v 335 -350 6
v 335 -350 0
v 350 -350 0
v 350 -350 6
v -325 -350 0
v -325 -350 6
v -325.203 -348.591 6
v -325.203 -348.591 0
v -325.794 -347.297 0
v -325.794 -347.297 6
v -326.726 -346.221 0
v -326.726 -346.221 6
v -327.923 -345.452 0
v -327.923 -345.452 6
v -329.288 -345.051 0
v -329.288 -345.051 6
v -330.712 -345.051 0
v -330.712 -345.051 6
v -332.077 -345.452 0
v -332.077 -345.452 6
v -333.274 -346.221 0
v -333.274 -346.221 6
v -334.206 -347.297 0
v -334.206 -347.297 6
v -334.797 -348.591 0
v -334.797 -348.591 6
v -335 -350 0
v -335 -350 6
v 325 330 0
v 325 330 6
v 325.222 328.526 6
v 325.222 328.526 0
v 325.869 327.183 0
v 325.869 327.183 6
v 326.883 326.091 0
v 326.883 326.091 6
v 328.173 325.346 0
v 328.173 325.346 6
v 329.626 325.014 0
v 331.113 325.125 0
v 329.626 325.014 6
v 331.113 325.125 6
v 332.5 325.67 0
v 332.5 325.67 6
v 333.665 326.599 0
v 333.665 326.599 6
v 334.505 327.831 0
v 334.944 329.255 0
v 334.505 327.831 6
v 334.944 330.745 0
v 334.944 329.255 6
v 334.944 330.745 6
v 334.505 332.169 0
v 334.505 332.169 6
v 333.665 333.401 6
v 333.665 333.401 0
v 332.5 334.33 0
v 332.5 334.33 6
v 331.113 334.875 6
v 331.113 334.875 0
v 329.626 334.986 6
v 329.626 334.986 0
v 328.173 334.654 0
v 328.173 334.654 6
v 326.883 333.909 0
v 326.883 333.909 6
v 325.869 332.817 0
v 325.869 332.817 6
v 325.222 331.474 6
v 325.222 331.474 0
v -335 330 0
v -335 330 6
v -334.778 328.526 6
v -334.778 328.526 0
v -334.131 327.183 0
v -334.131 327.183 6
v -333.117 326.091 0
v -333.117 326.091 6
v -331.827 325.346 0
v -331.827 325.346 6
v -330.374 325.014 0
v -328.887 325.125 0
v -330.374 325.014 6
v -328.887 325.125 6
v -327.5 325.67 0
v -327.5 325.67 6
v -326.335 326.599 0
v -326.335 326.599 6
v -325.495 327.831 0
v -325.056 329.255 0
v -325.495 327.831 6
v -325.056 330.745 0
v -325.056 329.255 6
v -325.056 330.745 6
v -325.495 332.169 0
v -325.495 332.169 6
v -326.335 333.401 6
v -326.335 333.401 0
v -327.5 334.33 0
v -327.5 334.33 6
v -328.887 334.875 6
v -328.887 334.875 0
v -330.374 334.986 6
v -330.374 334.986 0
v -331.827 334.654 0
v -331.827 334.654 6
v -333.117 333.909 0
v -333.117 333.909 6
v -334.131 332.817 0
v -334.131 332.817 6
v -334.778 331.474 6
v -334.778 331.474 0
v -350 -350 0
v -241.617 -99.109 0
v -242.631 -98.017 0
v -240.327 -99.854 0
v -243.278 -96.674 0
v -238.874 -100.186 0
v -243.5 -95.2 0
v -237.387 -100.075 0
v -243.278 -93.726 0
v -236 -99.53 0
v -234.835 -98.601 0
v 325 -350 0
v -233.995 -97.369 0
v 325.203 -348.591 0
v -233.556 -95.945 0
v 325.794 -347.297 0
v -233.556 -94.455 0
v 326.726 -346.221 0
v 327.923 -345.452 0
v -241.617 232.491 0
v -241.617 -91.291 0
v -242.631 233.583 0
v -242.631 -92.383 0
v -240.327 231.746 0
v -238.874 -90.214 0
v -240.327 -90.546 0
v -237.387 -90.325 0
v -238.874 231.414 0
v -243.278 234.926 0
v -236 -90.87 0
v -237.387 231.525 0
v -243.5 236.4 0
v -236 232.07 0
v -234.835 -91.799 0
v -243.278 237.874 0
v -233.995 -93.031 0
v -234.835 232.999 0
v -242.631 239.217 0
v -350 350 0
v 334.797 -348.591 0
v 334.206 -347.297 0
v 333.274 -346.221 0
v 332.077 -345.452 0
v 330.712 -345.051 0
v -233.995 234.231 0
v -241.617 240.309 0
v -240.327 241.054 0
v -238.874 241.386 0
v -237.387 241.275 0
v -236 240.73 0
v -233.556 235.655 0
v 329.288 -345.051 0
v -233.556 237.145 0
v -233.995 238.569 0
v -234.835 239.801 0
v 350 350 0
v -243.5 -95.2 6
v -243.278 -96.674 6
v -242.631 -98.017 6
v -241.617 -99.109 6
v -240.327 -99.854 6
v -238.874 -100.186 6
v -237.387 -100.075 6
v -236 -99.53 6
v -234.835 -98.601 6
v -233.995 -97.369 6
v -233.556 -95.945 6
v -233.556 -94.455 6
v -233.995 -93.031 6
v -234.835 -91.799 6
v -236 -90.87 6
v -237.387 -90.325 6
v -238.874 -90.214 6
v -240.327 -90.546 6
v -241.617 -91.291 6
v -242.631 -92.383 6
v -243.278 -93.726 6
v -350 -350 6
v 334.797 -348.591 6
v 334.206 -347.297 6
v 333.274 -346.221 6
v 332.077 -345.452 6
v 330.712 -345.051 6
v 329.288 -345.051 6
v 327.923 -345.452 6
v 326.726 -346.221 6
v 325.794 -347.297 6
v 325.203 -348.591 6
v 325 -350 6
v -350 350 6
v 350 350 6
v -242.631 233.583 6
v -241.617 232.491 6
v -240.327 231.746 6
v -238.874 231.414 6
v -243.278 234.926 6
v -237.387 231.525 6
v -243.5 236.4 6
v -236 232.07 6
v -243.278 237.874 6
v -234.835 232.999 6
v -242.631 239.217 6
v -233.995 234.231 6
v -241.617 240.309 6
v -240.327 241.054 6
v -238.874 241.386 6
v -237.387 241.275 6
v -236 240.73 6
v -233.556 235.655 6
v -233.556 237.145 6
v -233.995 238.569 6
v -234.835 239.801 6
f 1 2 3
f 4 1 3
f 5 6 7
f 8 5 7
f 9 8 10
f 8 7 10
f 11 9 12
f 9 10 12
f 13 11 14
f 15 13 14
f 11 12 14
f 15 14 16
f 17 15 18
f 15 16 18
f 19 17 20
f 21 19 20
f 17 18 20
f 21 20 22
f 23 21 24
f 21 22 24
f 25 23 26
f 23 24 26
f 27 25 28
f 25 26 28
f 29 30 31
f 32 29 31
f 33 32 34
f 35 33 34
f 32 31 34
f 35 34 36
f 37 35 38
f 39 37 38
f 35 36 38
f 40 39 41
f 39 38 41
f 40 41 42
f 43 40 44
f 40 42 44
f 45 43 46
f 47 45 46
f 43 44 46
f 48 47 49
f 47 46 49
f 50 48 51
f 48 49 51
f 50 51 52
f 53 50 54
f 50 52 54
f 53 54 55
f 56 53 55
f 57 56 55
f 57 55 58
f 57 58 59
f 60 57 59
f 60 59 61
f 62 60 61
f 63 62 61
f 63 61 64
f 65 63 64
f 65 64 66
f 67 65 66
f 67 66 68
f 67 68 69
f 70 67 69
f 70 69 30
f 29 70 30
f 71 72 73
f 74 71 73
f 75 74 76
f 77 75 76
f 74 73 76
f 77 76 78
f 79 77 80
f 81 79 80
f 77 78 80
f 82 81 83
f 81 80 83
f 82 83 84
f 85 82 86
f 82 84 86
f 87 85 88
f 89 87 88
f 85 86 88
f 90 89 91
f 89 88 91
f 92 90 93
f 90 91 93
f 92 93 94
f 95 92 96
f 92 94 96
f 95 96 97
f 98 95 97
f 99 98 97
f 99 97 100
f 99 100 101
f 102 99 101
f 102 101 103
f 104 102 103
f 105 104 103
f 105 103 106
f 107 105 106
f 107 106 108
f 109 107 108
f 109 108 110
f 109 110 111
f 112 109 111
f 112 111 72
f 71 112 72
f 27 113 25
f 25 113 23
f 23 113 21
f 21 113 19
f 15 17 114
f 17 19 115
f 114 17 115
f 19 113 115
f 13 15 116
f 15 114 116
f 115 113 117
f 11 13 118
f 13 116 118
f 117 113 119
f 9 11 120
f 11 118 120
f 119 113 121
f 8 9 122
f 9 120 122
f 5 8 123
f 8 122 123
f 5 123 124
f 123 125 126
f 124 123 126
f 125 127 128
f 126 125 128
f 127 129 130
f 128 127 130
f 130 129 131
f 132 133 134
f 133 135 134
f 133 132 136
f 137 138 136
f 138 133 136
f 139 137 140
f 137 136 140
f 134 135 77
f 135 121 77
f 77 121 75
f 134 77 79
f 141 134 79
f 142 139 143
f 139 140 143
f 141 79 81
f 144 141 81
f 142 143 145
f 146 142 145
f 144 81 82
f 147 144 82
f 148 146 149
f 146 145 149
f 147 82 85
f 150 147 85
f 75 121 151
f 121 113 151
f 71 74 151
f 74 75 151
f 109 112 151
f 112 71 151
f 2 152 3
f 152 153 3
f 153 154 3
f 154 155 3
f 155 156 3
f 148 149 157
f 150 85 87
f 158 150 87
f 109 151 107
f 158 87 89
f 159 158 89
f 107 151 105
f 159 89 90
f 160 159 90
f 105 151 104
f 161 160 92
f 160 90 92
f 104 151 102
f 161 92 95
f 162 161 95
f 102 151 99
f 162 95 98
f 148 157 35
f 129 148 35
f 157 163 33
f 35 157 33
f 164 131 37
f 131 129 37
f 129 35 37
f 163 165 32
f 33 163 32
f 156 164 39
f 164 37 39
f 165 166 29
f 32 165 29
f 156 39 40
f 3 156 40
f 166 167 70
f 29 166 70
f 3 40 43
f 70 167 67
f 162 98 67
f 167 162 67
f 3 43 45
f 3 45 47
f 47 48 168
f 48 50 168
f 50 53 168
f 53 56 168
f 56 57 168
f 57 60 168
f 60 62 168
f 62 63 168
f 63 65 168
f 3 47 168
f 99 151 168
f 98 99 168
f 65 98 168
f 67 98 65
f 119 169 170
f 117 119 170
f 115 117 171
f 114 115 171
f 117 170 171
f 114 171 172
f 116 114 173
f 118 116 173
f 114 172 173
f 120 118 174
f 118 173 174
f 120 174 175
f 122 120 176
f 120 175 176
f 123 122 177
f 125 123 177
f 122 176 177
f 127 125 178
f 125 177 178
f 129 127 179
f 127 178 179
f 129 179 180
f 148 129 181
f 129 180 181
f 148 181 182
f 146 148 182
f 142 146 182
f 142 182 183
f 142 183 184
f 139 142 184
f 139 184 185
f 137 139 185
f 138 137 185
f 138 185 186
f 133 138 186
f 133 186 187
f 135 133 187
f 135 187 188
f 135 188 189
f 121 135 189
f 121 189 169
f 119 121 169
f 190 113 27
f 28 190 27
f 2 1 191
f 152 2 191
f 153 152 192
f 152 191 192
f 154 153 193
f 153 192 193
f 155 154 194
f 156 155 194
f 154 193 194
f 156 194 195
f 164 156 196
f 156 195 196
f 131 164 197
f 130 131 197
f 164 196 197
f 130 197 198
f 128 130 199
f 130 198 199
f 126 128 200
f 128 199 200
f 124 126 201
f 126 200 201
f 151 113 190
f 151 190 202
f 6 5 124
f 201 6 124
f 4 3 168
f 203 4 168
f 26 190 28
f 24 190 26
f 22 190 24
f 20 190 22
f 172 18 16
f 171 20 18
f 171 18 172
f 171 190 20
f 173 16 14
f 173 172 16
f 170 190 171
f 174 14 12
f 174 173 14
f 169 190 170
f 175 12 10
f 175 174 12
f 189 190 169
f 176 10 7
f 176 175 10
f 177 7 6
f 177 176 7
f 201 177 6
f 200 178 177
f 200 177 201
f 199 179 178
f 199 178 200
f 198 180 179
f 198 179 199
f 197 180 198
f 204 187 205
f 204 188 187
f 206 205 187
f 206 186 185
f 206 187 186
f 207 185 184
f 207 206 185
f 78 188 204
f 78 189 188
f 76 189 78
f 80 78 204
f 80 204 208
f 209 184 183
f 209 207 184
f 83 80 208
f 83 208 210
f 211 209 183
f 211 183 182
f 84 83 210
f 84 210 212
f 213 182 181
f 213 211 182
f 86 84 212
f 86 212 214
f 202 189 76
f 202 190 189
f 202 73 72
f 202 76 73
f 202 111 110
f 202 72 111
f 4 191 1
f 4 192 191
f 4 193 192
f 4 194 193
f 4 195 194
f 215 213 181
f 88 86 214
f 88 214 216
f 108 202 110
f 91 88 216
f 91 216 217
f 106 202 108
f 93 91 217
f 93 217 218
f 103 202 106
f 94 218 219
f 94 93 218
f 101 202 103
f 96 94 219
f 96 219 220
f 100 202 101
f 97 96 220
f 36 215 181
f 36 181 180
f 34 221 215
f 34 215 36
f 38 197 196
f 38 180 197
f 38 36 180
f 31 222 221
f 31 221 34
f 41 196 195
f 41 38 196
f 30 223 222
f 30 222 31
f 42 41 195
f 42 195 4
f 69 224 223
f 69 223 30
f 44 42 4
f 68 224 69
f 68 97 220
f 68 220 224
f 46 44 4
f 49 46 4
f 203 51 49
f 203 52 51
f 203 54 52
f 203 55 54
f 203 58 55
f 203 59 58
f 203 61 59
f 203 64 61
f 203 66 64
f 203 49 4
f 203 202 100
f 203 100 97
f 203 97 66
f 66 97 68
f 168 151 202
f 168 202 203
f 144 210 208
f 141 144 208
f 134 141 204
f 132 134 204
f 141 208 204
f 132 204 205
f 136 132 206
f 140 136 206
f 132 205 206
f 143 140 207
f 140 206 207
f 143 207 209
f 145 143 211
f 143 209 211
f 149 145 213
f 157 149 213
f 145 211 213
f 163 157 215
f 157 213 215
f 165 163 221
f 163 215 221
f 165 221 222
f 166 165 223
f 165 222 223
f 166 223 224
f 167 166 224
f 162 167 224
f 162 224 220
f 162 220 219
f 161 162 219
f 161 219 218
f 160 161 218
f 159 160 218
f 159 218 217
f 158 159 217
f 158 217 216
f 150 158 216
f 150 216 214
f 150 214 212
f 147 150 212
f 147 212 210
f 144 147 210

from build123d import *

# Parameters (mm, degrees)
F0_W     = 700
F0_H     = 700
F1_DEPTH = 6
F2_D     = 10
F2_DEPTH = 12
F2_TIP   = 3.0043030951


with BuildPart() as f1:
    # F0 (on Top) → F1 (new body)
    with BuildSketch(Plane.XY):
        Rectangle(F0_W, F0_H)
    extrude(amount=F1_DEPTH)

    # F2
    with Locations(Plane(origin=(0, 0, 0), x_dir=(1, 0, 0), z_dir=(0, 0, -1))):
        with Locations((-330, -330), (330, -330), (330, 350), (-330, 350), (-238.5, -236.4), (-238.5, 95.2)):
            Hole(F2_D / 2, depth=F2_DEPTH)
            with Locations((0, 0, -(F2_DEPTH + F2_TIP / 2))):  # 118° drill point
                Cone(0, F2_D / 2, F2_TIP, mode=Mode.SUBTRACT)


solid = f1.part
